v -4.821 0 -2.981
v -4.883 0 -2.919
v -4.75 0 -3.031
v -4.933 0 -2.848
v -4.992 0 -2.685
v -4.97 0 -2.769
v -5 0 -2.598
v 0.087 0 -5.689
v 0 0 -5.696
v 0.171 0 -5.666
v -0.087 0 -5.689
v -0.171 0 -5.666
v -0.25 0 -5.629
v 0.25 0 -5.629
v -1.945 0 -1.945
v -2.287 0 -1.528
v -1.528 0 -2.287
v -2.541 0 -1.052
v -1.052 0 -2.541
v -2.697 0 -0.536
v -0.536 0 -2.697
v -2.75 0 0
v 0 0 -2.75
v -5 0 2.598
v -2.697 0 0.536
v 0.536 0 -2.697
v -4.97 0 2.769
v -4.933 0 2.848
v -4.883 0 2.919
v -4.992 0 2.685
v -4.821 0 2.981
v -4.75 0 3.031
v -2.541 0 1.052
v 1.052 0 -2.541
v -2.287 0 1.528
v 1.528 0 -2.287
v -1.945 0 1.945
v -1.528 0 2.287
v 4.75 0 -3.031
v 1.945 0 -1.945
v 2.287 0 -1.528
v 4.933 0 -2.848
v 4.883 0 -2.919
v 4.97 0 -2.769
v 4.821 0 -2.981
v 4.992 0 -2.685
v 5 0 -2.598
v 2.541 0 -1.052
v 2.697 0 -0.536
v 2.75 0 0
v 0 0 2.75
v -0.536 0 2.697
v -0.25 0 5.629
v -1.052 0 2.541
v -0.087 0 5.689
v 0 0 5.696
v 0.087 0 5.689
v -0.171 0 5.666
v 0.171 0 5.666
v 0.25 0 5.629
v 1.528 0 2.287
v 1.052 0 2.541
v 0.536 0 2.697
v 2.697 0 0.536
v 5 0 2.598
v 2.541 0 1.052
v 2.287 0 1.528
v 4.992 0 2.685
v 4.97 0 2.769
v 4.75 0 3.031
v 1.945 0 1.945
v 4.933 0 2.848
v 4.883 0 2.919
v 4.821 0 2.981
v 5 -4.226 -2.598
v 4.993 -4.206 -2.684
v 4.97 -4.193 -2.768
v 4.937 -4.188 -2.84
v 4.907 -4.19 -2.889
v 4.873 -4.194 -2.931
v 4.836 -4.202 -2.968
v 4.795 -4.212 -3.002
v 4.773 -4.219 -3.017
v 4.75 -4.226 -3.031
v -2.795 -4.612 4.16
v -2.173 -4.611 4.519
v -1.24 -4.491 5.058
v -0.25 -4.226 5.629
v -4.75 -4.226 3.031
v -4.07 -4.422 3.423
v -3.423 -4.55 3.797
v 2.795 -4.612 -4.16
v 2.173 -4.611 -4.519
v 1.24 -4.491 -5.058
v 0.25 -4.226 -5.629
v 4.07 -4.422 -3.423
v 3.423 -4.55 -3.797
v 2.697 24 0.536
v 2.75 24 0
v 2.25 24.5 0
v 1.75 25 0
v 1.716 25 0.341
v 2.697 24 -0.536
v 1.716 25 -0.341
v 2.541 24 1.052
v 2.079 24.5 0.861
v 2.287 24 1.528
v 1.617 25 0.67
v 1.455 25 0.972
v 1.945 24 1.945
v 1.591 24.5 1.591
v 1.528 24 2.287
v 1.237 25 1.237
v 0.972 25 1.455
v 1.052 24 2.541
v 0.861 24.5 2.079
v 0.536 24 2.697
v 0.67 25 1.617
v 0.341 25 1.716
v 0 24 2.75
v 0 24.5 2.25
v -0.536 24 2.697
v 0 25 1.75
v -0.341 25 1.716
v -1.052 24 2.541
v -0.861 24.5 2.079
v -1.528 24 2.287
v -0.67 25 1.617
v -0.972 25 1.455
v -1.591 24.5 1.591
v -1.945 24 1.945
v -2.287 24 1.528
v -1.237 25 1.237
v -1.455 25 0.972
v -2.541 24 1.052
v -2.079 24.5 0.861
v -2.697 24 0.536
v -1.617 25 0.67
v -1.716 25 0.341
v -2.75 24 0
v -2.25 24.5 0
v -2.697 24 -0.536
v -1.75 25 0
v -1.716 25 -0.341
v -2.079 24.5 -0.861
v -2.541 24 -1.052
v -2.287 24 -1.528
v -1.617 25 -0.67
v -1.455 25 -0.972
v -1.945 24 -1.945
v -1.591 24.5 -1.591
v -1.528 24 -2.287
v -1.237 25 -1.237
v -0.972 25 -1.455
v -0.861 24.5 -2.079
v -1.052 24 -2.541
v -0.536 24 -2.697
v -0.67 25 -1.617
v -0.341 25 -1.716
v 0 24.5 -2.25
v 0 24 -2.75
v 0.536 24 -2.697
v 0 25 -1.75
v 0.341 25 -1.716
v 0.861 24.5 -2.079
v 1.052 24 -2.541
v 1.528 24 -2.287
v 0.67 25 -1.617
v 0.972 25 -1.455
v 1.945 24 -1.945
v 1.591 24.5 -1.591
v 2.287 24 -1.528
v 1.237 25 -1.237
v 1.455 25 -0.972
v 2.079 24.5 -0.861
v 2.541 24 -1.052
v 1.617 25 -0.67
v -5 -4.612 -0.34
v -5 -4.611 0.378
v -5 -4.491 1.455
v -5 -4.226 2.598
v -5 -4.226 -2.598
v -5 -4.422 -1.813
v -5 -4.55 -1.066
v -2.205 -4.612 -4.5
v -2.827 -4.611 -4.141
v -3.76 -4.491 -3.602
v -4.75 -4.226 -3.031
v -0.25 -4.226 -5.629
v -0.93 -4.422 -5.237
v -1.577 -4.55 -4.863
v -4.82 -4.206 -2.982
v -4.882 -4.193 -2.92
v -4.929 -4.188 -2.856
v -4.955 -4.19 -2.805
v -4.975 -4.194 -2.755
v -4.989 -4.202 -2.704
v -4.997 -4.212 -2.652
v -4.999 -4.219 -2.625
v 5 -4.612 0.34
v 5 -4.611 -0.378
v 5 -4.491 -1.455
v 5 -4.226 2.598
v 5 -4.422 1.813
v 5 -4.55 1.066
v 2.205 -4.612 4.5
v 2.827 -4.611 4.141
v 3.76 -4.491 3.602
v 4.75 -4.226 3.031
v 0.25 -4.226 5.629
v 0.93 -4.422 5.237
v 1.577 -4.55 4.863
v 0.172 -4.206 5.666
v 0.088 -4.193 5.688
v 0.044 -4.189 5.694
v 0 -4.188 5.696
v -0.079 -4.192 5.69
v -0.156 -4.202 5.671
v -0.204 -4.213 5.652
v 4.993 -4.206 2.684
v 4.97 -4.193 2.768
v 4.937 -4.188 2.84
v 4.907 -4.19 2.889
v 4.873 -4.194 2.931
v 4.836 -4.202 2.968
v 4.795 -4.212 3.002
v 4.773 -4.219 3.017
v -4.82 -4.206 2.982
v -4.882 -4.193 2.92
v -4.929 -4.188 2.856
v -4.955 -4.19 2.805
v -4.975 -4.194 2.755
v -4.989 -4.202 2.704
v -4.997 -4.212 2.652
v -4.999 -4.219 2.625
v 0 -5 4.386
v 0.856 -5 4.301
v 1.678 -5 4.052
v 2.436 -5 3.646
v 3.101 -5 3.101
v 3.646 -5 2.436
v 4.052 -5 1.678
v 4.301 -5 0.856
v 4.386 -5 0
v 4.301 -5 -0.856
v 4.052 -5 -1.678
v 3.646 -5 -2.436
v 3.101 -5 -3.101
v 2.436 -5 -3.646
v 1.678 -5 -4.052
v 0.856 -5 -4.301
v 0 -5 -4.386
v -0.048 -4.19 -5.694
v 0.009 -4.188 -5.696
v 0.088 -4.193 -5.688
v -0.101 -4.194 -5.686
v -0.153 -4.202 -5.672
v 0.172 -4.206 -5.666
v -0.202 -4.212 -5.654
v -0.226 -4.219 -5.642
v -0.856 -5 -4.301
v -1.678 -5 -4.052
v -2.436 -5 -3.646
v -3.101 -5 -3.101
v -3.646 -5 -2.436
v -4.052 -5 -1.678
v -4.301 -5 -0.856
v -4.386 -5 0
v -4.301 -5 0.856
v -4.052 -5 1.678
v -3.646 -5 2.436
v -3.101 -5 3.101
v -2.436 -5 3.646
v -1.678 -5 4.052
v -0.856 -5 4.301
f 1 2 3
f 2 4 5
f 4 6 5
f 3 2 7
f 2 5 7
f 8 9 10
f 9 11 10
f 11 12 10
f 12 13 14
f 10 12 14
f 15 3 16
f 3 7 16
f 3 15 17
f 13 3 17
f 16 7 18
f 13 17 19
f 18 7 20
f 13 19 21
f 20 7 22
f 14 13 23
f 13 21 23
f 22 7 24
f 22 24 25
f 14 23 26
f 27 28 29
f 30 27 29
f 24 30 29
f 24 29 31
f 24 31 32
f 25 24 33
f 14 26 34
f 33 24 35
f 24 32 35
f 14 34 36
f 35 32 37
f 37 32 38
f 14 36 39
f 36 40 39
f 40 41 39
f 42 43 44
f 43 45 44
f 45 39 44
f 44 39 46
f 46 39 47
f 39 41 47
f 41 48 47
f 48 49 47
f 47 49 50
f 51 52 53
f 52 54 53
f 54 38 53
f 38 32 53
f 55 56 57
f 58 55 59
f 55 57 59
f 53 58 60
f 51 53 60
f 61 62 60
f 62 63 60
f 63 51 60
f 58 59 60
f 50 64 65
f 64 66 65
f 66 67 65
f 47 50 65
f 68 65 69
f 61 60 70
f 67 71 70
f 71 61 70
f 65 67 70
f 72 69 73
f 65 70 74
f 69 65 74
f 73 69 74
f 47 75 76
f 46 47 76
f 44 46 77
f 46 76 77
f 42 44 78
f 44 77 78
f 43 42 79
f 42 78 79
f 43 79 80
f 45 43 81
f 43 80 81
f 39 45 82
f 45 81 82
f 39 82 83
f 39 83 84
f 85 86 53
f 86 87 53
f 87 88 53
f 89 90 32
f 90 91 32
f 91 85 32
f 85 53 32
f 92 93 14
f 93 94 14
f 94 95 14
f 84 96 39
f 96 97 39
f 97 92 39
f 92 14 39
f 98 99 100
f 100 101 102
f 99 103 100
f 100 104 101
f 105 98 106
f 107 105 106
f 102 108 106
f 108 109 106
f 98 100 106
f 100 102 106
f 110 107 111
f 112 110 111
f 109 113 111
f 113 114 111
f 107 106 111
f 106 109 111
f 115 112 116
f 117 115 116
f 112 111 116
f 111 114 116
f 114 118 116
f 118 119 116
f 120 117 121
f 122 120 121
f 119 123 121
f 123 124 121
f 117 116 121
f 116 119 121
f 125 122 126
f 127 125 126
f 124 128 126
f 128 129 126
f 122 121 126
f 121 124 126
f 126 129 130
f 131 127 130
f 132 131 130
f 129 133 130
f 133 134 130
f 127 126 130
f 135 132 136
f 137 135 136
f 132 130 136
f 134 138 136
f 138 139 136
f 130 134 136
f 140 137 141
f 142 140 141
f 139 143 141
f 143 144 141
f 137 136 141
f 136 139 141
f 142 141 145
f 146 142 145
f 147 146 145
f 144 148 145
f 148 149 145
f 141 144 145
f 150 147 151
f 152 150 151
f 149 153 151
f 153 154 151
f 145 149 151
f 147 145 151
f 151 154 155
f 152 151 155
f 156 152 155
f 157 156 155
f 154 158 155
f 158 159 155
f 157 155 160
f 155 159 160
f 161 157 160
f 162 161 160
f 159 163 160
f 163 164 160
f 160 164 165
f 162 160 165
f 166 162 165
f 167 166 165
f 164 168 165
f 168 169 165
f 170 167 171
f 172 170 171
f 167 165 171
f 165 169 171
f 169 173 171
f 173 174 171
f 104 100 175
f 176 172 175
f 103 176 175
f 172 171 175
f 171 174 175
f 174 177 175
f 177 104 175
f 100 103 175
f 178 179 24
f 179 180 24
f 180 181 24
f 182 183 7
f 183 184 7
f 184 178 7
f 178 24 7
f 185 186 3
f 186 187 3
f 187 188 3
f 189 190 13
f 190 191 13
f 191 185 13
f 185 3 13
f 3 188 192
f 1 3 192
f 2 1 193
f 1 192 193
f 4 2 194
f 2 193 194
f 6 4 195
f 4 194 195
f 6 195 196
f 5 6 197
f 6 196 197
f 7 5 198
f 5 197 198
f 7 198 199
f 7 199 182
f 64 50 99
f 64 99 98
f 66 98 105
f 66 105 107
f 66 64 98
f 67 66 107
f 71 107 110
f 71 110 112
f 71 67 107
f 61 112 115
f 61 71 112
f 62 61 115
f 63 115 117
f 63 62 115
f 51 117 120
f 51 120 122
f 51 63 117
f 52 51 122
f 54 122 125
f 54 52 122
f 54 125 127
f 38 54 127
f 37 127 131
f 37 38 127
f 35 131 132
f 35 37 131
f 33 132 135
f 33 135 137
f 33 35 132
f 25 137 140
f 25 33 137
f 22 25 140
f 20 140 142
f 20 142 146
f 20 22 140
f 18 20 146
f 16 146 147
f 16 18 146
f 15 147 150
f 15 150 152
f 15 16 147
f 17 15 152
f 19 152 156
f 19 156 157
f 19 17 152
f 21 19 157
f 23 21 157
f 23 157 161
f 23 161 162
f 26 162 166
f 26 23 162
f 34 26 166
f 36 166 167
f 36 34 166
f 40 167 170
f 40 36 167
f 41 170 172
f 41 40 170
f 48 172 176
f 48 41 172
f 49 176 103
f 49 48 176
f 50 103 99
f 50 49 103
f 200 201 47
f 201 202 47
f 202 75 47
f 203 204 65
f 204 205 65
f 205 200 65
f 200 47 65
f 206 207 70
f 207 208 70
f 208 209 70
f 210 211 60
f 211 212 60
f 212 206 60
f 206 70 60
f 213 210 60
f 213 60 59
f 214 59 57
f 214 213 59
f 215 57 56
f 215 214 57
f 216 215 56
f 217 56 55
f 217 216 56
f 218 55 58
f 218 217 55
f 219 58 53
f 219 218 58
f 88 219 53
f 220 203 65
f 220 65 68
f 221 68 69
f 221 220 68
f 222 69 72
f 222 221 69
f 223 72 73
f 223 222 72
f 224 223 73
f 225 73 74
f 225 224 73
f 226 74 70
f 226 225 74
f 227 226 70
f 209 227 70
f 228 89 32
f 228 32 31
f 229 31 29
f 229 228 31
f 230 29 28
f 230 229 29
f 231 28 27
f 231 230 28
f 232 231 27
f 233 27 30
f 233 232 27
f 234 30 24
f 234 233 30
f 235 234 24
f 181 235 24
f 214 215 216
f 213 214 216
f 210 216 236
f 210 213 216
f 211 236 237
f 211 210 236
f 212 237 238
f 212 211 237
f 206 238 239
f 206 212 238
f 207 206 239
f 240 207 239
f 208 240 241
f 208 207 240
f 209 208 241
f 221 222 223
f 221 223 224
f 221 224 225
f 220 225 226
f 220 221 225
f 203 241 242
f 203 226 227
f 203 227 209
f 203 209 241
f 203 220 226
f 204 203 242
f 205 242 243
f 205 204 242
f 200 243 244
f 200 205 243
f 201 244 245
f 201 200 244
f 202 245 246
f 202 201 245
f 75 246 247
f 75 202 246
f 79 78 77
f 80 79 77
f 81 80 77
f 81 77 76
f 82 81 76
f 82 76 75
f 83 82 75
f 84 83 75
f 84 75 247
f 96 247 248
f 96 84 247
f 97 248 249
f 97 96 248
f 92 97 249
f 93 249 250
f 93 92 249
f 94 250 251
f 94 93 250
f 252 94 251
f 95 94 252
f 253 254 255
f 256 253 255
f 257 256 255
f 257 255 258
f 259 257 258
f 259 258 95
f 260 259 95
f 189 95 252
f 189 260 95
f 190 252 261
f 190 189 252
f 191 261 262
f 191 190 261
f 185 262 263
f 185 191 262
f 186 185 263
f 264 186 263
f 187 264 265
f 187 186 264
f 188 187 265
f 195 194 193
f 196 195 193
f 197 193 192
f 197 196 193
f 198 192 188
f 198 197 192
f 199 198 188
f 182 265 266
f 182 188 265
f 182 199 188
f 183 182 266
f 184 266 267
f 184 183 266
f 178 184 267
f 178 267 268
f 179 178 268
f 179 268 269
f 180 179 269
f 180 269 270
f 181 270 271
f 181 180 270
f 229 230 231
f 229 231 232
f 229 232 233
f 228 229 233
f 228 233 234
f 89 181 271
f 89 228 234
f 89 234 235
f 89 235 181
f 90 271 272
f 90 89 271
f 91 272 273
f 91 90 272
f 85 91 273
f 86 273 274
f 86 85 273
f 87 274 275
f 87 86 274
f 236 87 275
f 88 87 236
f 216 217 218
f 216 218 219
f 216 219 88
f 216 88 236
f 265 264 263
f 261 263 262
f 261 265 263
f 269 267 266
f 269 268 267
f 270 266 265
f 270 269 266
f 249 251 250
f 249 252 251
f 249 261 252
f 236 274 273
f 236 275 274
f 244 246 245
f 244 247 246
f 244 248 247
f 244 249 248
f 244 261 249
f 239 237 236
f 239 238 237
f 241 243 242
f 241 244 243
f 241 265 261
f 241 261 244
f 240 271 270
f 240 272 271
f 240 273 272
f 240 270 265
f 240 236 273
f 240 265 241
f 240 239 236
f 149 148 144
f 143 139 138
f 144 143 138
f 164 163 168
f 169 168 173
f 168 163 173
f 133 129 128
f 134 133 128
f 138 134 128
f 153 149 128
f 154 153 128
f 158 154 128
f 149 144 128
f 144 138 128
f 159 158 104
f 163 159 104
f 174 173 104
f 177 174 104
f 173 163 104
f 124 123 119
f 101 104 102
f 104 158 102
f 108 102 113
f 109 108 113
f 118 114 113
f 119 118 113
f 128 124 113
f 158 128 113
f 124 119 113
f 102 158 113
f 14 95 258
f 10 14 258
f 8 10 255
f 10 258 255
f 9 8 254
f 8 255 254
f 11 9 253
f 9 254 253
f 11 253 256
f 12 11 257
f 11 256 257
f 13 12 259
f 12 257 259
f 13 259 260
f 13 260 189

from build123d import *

# Parameters (mm, degrees)
F0_R     = 2.75
F1_DEPTH = 25
F2_SIZE  = 1
F4_DEPTH = 5
F5_R     = 0.5


with BuildPart() as f1:
    # F0 (on Front) → F1 (new body)
    with BuildSketch(Plane.XZ):
        Circle(F0_R)
    extrude(amount=-F1_DEPTH)

    # F2
    f2_edges = [f1.edges().sort_by_distance(p)[0] for p in [
        (-2.75, 25, 0),
    ]]
    chamfer(f2_edges, length=F2_SIZE)

    # F3 (on face) → F4 (join)
    with BuildSketch(Plane.XZ):
        Polygon((5, -2.886751), (5, 2.886751), (0, 5.773503), (-5, 2.886751), (-5, -2.886751), (0, -5.773503), align=None)
    extrude(amount=F4_DEPTH)

    # F5
    f5_edges = [f1.edges().sort_by_distance(p)[0] for p in [
        (5, -2.5, 2.886751),
        (0, -2.5, 5.773503),
        (-5, -2.5, 2.886751),
        (0, -2.5, -5.773503),
        (-5, -2.5, -2.886751),
        (5, -2.5, -2.886751),
    ]]
    fillet(f5_edges, radius=F5_R)

    # F6 (on Right) → F7 (revolve, cut)
    with BuildSketch(Plane.YZ):
        Polygon((-5.362704, 6), (-5.362704, 3.8), (-4, 6), align=None)
    revolve(axis=Axis((0, -4.871394, 0), (0, 1, 0)), mode=Mode.SUBTRACT)


solid = f1.part
